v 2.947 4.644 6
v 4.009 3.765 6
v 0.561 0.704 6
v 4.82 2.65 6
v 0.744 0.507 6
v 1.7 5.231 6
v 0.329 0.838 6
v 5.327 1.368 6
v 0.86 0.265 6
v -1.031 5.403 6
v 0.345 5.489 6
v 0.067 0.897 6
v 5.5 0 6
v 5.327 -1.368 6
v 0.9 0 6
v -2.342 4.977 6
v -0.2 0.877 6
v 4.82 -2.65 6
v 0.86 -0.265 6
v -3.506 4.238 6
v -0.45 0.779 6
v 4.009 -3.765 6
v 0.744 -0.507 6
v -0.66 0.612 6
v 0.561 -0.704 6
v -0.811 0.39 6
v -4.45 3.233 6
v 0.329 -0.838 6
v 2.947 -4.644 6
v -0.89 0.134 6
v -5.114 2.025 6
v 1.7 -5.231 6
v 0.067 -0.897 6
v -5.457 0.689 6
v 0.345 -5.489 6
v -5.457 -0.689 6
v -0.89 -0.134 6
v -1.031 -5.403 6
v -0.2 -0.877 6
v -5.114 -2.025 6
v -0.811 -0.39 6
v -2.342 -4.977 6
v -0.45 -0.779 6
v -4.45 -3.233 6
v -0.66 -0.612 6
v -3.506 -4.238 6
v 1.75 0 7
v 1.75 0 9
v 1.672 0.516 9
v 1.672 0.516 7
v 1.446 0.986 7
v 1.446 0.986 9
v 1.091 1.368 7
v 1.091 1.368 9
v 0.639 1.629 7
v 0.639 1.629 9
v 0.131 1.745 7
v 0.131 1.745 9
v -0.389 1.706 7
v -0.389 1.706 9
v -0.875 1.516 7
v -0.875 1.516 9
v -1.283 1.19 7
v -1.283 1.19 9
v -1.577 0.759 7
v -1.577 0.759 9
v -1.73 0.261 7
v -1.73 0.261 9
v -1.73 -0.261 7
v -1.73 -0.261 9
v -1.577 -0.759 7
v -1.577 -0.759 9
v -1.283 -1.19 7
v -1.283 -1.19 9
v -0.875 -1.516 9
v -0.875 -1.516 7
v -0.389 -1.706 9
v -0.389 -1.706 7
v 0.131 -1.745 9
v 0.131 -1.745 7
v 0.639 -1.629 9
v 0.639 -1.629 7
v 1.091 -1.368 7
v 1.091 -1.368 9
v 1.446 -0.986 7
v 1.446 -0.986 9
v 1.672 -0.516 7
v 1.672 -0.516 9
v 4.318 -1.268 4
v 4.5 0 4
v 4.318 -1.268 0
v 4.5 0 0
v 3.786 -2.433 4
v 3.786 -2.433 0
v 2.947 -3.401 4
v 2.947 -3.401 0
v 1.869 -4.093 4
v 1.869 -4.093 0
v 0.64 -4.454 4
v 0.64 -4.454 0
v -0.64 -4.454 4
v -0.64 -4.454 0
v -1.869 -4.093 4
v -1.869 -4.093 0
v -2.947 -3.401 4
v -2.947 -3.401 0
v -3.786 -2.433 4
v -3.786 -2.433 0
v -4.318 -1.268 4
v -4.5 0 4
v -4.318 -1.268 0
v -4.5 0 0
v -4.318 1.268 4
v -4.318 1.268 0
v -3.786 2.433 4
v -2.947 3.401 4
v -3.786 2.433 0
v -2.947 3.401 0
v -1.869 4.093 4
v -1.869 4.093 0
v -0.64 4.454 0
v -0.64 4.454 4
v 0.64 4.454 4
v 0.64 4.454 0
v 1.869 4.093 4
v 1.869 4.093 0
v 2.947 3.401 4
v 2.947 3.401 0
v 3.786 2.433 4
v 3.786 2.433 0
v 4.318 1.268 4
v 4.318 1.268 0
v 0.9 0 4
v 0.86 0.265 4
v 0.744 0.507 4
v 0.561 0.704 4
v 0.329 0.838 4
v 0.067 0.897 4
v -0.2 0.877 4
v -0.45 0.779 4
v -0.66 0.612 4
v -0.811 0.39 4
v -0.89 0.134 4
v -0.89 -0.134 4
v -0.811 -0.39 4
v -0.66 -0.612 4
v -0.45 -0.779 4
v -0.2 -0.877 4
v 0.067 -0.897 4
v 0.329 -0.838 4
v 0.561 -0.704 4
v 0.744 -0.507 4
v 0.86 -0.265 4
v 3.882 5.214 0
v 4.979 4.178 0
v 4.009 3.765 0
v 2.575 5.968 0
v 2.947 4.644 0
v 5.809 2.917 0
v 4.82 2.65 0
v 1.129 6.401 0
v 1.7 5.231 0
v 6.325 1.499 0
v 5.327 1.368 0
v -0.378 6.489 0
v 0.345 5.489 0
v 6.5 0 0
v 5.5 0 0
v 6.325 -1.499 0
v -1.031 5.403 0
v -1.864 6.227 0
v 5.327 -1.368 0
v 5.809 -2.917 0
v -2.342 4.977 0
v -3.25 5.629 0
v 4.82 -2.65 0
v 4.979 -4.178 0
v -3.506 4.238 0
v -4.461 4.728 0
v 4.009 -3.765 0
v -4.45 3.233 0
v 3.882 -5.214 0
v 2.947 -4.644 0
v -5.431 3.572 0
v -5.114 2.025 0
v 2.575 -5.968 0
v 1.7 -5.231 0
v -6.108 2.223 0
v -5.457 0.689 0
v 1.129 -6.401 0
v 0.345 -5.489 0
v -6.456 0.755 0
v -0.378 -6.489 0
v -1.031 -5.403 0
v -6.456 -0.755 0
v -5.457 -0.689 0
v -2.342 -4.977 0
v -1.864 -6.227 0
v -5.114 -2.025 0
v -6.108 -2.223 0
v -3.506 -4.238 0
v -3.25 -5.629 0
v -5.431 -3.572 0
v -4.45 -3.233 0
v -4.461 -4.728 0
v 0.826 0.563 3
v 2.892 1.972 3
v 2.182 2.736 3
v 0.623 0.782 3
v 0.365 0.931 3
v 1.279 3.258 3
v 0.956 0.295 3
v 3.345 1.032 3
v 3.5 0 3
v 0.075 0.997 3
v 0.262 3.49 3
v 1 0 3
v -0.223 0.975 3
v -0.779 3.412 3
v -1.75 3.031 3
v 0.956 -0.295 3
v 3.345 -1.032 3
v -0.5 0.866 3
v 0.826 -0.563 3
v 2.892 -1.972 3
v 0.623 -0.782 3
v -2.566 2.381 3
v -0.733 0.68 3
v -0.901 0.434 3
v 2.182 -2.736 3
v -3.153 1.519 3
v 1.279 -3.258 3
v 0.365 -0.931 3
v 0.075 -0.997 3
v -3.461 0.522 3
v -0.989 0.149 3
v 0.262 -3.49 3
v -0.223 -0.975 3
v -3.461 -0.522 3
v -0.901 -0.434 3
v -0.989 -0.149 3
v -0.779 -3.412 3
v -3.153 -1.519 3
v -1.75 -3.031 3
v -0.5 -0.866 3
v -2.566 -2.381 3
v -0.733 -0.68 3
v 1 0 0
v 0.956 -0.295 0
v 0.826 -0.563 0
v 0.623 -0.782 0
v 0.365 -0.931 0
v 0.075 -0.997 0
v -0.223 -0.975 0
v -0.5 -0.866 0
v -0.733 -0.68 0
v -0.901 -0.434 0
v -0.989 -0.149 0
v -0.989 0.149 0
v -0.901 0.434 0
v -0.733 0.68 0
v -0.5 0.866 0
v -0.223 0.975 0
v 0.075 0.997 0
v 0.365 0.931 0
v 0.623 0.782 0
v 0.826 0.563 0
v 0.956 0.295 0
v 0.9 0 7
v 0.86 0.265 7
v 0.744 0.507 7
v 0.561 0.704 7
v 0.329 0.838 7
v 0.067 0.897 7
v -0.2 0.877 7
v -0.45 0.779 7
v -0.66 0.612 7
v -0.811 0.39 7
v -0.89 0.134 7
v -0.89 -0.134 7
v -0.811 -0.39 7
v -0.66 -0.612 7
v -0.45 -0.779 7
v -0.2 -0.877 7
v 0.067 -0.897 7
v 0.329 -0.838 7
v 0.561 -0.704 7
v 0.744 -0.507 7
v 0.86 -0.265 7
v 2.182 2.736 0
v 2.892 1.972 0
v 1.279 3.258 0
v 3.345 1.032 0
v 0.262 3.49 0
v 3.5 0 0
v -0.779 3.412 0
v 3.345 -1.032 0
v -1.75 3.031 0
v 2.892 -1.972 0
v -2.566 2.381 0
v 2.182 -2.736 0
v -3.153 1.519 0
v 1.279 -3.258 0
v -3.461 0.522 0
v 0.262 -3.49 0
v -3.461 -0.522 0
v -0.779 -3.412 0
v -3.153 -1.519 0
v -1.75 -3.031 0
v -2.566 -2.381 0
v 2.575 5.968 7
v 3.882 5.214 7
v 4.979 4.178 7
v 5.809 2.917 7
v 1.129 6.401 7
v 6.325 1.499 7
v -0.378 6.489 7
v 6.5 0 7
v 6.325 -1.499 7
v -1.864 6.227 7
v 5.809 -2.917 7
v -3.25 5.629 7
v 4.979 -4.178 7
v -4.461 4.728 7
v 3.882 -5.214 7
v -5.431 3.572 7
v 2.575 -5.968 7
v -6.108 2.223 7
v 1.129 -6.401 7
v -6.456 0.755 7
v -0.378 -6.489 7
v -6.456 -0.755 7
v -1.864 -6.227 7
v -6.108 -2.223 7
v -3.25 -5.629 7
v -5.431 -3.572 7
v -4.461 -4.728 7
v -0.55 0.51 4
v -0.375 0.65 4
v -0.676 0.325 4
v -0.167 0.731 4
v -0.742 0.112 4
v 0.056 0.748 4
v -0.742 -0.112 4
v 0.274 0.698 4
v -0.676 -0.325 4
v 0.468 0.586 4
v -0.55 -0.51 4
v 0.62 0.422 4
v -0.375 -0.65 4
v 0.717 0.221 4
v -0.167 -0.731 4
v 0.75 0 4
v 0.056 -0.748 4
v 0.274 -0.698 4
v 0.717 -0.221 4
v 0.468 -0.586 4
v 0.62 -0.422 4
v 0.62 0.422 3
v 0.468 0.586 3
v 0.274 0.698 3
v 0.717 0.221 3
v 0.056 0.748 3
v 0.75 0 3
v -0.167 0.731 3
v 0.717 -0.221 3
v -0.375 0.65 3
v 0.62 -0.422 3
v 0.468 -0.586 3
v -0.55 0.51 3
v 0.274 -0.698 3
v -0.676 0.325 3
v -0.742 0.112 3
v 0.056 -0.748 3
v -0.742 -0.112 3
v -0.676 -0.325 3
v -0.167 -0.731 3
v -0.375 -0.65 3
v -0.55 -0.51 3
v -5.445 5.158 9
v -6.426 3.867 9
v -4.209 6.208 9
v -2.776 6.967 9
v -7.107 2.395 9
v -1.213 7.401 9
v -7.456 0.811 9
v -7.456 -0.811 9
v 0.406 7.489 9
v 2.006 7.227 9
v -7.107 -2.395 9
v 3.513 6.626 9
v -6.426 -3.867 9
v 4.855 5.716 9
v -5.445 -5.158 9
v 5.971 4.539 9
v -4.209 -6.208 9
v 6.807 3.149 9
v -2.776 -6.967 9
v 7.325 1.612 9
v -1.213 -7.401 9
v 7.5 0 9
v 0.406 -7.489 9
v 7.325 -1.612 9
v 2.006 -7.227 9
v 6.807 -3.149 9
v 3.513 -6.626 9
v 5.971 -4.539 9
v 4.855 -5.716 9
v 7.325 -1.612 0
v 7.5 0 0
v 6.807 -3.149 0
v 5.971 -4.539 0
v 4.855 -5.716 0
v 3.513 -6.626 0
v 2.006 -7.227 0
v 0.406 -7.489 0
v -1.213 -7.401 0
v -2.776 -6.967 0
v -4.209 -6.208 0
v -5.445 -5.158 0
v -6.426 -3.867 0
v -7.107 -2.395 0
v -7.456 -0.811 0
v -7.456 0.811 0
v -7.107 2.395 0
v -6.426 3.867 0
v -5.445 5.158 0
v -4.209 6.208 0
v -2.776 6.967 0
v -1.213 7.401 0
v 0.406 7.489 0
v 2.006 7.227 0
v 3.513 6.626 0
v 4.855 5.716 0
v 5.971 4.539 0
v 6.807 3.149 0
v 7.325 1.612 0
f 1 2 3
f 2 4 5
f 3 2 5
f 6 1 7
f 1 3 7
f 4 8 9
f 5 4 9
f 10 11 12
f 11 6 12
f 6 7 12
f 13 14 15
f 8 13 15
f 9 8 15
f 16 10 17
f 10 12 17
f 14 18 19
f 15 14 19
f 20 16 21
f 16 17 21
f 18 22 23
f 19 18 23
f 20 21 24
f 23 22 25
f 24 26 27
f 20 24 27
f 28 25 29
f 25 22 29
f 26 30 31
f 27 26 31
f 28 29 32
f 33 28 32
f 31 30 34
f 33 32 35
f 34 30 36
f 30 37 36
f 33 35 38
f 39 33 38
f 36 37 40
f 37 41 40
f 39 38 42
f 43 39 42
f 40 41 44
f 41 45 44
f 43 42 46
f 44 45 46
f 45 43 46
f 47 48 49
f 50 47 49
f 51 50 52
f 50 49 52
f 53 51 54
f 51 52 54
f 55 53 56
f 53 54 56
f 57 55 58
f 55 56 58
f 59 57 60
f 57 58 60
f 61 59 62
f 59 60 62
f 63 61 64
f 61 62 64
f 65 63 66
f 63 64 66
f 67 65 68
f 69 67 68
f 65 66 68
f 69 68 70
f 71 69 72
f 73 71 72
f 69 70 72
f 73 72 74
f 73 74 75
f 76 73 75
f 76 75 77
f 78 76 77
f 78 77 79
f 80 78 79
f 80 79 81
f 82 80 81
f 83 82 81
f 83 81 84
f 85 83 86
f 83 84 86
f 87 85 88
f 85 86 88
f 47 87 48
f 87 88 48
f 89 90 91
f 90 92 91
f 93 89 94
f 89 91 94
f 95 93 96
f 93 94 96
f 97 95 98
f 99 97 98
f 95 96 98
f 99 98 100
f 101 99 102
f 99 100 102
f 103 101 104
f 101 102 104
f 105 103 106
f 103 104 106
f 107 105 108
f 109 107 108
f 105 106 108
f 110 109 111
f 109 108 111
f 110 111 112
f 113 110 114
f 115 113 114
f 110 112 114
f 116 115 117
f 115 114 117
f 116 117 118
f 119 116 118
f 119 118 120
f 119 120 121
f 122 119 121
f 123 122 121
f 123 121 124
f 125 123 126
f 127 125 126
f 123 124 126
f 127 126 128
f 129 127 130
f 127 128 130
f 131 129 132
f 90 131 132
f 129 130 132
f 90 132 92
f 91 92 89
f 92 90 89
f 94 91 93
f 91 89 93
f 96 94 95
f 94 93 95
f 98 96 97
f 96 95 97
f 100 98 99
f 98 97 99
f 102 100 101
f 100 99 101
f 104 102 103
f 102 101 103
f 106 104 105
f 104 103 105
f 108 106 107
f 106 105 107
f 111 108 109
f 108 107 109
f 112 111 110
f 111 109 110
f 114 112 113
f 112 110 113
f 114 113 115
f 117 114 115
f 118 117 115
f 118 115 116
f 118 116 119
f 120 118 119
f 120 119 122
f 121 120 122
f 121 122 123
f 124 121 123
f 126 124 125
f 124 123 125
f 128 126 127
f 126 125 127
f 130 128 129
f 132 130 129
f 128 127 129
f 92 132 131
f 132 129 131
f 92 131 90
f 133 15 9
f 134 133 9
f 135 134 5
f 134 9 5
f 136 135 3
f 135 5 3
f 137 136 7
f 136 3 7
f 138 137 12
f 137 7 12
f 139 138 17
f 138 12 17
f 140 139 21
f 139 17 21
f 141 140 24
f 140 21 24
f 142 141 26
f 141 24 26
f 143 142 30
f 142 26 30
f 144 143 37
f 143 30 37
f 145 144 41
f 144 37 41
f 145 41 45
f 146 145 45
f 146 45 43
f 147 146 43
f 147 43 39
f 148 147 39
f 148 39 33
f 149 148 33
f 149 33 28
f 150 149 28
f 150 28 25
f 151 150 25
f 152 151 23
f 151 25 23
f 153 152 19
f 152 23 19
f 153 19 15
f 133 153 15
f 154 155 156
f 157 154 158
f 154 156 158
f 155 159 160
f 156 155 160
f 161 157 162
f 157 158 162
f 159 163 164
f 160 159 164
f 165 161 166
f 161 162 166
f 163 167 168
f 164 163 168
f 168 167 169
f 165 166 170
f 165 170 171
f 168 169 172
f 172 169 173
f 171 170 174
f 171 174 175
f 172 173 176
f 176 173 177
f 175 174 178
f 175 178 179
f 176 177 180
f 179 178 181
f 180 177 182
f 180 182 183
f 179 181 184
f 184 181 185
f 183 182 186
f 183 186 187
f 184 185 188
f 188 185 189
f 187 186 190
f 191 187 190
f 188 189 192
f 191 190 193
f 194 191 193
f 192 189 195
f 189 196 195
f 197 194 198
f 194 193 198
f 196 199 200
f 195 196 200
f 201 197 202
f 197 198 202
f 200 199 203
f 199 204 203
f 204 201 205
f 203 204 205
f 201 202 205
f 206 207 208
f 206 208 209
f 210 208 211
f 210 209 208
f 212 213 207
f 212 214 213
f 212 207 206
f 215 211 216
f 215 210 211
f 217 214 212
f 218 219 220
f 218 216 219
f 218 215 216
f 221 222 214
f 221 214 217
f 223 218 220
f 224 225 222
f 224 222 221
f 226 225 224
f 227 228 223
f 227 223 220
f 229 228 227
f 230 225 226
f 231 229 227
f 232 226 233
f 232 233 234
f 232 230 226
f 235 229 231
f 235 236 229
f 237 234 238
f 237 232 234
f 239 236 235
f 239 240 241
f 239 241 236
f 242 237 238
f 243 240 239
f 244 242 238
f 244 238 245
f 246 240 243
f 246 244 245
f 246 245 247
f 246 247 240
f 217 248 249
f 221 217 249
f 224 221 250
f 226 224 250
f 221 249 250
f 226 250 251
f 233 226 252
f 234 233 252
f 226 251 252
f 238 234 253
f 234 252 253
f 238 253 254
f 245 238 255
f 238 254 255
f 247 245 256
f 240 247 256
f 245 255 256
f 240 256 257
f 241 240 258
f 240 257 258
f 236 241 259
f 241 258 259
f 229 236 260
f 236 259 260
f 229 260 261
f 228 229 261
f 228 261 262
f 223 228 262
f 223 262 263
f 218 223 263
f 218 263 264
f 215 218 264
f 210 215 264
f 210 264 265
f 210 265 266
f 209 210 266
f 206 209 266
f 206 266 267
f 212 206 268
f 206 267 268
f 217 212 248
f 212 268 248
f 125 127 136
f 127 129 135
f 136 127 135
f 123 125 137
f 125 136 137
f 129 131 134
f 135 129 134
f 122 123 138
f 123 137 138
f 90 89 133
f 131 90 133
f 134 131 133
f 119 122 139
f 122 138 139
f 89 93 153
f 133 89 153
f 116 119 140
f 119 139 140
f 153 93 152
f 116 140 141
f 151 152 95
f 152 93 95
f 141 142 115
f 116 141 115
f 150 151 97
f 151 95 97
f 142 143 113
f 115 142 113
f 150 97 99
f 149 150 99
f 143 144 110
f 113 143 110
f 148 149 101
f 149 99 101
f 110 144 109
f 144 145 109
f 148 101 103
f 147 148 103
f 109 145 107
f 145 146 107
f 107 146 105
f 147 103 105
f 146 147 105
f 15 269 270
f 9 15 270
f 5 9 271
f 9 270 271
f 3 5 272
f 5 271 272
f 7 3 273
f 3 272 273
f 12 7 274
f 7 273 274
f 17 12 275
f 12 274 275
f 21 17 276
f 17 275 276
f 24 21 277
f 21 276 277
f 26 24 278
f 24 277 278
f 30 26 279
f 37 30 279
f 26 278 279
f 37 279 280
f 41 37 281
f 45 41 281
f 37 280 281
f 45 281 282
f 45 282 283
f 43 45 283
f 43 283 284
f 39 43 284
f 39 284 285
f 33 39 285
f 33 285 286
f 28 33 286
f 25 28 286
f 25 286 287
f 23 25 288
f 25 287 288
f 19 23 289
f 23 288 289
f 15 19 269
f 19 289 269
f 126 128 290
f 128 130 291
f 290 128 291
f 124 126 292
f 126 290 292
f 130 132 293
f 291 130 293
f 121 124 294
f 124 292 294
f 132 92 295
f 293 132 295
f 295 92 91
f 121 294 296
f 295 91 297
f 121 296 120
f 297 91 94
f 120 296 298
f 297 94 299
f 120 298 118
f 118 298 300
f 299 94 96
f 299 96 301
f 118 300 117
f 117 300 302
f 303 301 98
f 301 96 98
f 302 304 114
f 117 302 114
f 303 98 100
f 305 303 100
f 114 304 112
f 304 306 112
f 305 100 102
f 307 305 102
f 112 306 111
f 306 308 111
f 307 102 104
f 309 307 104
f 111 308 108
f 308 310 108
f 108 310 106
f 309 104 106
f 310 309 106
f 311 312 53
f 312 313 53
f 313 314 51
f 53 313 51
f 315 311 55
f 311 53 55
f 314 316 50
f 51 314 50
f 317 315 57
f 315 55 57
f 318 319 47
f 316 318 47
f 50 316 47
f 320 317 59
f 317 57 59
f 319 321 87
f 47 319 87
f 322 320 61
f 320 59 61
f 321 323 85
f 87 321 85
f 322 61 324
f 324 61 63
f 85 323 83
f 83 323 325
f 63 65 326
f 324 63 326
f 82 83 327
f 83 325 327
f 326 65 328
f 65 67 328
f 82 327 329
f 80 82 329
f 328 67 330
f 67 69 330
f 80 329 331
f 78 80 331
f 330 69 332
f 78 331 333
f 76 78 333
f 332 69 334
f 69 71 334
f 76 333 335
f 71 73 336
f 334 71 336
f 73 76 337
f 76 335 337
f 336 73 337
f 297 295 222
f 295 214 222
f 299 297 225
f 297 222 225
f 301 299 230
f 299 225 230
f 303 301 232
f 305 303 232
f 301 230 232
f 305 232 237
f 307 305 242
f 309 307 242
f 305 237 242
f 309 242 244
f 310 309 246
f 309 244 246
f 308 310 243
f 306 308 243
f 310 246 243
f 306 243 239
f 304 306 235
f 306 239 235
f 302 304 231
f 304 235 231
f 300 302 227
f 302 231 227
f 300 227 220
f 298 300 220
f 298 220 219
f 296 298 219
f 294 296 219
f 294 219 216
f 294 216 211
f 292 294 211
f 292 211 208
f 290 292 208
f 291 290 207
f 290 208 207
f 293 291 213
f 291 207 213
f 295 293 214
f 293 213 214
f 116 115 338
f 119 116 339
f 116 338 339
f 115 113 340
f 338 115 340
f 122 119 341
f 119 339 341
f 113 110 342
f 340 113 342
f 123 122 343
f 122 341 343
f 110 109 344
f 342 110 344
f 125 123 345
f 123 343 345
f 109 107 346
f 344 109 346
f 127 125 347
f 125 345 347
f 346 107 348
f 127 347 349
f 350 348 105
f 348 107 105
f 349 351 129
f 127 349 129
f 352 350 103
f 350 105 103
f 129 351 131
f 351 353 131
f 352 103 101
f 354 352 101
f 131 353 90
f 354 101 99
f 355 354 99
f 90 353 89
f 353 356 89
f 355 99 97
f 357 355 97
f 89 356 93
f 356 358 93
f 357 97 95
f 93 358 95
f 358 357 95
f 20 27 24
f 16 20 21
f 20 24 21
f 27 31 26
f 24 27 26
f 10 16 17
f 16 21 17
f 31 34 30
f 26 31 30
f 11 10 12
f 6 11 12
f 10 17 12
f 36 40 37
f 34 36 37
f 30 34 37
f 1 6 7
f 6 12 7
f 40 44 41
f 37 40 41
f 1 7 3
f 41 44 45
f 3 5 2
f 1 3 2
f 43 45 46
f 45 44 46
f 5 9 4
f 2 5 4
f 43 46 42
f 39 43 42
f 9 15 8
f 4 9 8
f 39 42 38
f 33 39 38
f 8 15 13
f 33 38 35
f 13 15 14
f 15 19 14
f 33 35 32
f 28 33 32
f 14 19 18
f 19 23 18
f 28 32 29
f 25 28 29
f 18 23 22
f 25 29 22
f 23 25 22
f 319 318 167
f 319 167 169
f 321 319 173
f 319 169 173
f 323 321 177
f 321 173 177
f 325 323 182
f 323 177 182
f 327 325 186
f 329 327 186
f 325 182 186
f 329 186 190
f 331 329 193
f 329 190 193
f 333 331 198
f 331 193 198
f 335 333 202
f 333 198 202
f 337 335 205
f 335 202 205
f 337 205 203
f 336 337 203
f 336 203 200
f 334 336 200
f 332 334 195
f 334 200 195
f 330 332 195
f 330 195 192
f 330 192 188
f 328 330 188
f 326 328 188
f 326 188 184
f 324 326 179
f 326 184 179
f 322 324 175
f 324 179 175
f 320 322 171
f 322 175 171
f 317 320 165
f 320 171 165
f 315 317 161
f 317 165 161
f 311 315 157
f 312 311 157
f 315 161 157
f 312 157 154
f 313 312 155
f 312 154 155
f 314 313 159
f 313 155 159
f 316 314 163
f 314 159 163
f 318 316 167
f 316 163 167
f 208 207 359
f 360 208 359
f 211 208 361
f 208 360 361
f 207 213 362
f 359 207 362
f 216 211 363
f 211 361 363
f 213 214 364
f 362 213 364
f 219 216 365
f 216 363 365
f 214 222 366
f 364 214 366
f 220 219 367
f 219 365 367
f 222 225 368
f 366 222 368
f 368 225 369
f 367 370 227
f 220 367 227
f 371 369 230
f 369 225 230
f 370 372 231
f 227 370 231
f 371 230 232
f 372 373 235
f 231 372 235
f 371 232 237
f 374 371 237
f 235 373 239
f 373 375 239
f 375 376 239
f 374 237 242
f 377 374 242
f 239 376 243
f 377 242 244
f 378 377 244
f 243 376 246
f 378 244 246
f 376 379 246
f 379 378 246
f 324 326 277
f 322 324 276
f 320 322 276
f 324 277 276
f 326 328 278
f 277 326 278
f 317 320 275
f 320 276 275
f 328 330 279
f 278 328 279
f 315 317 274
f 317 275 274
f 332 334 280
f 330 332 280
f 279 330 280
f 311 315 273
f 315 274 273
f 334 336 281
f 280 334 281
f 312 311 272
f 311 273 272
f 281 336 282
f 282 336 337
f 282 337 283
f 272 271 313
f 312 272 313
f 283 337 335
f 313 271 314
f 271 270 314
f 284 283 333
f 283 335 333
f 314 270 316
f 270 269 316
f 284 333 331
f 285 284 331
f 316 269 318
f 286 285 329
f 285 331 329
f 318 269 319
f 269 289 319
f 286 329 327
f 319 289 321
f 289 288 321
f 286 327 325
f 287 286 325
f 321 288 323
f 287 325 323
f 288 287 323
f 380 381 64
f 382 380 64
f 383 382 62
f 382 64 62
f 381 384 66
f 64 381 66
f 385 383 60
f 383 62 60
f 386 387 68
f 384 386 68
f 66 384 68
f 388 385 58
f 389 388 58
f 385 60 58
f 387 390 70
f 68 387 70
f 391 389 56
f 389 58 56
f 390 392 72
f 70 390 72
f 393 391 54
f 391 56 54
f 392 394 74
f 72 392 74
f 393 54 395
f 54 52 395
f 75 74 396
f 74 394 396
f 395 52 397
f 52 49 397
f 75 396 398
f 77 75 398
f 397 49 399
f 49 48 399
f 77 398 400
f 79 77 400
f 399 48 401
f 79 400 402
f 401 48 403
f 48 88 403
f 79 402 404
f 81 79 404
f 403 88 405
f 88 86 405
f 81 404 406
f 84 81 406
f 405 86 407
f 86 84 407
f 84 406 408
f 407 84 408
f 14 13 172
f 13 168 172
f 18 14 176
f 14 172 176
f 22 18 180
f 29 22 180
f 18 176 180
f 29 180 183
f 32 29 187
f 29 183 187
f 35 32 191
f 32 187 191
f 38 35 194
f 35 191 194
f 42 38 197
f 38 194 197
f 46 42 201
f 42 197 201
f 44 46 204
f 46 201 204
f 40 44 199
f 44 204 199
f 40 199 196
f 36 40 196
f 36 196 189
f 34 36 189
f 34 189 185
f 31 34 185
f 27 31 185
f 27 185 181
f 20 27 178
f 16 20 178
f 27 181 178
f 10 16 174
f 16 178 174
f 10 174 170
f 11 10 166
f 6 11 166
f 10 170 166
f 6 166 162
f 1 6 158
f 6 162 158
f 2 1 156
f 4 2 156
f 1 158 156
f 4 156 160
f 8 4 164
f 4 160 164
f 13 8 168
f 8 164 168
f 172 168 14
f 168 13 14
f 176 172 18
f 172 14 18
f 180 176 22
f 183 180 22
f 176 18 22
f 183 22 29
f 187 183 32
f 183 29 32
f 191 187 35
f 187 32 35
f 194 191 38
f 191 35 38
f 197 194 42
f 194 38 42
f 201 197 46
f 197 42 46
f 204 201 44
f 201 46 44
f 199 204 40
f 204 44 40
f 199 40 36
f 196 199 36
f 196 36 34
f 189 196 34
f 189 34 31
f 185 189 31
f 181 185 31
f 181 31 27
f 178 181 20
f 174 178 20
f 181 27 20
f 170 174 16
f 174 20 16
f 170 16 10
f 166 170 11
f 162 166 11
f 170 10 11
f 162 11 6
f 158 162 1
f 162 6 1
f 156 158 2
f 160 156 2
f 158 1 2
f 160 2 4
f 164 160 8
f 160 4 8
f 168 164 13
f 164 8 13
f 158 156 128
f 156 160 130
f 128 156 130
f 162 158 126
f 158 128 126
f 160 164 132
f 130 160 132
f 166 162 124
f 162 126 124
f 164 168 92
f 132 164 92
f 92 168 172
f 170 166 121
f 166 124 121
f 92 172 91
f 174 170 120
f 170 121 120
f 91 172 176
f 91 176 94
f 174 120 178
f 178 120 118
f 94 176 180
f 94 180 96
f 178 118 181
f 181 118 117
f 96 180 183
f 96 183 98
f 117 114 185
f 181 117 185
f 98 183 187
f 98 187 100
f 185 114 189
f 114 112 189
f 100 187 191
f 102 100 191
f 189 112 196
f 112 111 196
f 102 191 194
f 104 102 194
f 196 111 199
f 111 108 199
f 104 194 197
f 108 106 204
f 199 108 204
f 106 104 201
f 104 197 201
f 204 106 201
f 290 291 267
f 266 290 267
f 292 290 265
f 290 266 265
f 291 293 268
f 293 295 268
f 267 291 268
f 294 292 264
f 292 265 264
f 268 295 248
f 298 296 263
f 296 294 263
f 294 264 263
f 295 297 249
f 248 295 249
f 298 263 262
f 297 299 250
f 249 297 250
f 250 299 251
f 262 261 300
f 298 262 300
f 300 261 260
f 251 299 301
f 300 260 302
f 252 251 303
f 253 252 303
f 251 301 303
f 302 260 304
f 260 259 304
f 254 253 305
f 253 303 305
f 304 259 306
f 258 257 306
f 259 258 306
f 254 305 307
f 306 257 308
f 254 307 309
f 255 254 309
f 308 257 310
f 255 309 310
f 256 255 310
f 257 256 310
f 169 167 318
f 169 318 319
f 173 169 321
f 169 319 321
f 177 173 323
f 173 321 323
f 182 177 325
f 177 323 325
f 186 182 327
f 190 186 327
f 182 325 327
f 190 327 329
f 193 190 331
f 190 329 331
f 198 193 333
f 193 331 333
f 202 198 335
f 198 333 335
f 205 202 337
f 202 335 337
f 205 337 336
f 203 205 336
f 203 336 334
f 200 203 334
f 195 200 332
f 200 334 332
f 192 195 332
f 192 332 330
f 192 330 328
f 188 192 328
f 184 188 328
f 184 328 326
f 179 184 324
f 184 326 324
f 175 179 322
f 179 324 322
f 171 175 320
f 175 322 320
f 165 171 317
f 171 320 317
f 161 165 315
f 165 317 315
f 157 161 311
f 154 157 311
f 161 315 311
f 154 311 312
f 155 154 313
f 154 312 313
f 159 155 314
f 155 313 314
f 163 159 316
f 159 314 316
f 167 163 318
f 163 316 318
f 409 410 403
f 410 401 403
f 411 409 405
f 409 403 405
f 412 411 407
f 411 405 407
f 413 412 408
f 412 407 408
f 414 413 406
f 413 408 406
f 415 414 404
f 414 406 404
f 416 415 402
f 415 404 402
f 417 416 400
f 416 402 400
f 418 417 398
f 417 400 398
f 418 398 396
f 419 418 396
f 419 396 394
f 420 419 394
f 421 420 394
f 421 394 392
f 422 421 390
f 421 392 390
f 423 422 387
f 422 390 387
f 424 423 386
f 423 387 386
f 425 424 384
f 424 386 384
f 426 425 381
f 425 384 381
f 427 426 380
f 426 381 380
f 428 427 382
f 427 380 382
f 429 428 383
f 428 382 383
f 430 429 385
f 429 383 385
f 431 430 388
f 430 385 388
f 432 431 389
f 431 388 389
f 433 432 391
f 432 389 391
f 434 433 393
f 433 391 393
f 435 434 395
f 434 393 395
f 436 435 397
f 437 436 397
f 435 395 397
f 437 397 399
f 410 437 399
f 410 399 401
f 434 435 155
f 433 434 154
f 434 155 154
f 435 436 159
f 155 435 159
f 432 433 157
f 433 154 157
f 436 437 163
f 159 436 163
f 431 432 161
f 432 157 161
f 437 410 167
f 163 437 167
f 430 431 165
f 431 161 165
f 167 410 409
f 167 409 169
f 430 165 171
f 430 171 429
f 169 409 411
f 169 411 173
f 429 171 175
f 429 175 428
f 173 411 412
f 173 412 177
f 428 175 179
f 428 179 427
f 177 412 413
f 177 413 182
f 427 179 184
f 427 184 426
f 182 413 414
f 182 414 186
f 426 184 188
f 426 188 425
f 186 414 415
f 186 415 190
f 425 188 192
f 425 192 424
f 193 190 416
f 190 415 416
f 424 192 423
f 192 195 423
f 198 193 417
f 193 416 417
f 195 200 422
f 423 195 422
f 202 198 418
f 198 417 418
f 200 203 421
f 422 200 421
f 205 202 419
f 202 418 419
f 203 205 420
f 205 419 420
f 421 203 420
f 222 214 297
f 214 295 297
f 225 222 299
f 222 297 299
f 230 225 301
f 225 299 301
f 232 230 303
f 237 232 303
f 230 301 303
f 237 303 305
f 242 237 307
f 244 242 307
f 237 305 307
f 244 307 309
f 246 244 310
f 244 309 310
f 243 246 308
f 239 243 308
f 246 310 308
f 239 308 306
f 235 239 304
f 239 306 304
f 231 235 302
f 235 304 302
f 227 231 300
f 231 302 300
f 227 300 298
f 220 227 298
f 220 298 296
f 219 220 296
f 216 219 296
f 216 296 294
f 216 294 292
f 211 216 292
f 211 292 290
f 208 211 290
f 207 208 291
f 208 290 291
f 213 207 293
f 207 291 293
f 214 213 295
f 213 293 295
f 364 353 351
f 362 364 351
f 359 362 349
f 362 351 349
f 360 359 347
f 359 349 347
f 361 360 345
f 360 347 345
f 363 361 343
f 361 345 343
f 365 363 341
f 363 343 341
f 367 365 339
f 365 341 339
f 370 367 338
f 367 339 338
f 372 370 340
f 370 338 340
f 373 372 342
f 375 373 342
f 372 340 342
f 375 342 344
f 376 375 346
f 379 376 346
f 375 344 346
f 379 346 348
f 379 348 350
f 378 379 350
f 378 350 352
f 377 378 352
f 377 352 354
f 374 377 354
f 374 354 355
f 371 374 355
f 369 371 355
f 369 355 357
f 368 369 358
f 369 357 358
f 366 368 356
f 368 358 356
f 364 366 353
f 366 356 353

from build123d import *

# Parameters (mm, degrees)
F0_W      = 3.5
F0_H      = 3
F2_R      = 1
F3_DEPTH  = 3
F5_R      = 0.75
F6_DEPTH  = 1
F8_R      = 0.9
F9_DEPTH  = 2
F11_R     = 0.9
F12_DEPTH = 1
F14_R     = 1.75
F15_DEPTH = 2


with BuildPart() as f1:
    # F0 (on Front) → F1 (revolve)
    with BuildSketch(Plane.XZ):
        with Locations((1.75, 1.5)):
            Rectangle(F0_W, F0_H)
    revolve(axis=Axis((0, 0, 1.5), (0, 0, -1)))

    # F2 (on face) → F3 (cut, through all)
    with BuildSketch(Plane(origin=(0, 0, 0), x_dir=(1, 0, 0), z_dir=(0, 0, -1))):
        Circle(F2_R)
    extrude(amount=-F3_DEPTH, mode=Mode.SUBTRACT)


with BuildPart() as f4:
    # F0 (on Front) → F4 (revolve)
    with BuildSketch(Plane.XZ):
        Polygon((3.5, 3), (3.5, 0), (4.5, 0), (4.5, 4), (0, 4), (0, 3), align=None)
    revolve(axis=Axis((0, 0, 2.75), (0, 0, -1)))

    # F5 (on face) → F6 (cut, through all)
    with BuildSketch(Plane.XY.offset(4)):
        Circle(F5_R)
    extrude(amount=-F6_DEPTH, mode=Mode.SUBTRACT)


with BuildPart() as f7:
    # F0 (on Front) → F7 (revolve)
    with BuildSketch(Plane.XZ):
        Polygon((4.5, 4), (4.5, 0), (5.5, 0), (5.5, 6), (0, 6), (0, 5.5), (0, 4), align=None)
    revolve(axis=Axis((0, 0, 4.5), (0, 0, -1)))

    # F8 (on face) → F9 (cut, through all)
    with BuildSketch(Plane.XY.offset(6)):
        Circle(F8_R)
    extrude(amount=-F9_DEPTH, mode=Mode.SUBTRACT)


with BuildPart() as f10:
    # F0 (on Front) → F10 (revolve)
    with BuildSketch(Plane.XZ):
        Polygon((5.5, 6), (5.5, 0), (6.5, 0), (6.5, 7), (0, 7), (0, 6), align=None)
    revolve(axis=Axis((0, 0, 2.75), (0, 0, -1)))

    # F11 (on face) → F12 (cut, through all)
    with BuildSketch(Plane.XY.offset(7)):
        Circle(F11_R)
    extrude(amount=-F12_DEPTH, mode=Mode.SUBTRACT)


with BuildPart() as f13:
    # F0 (on Front) → F13 (revolve)
    with BuildSketch(Plane.XZ):
        Polygon((6.5, 7), (6.5, 0), (7.5, 0), (7.5, 9), (0, 9), (0, 7), align=None)
    revolve(axis=Axis((0, 0, 2.75), (0, 0, -1)))

    # F14 (on face) → F15 (cut, through all)
    with BuildSketch(Plane.XY.offset(9)):
        Circle(F14_R)
    extrude(amount=-F15_DEPTH, mode=Mode.SUBTRACT)


solid = Compound([f1.part, f4.part, f7.part, f10.part, f13.part])
